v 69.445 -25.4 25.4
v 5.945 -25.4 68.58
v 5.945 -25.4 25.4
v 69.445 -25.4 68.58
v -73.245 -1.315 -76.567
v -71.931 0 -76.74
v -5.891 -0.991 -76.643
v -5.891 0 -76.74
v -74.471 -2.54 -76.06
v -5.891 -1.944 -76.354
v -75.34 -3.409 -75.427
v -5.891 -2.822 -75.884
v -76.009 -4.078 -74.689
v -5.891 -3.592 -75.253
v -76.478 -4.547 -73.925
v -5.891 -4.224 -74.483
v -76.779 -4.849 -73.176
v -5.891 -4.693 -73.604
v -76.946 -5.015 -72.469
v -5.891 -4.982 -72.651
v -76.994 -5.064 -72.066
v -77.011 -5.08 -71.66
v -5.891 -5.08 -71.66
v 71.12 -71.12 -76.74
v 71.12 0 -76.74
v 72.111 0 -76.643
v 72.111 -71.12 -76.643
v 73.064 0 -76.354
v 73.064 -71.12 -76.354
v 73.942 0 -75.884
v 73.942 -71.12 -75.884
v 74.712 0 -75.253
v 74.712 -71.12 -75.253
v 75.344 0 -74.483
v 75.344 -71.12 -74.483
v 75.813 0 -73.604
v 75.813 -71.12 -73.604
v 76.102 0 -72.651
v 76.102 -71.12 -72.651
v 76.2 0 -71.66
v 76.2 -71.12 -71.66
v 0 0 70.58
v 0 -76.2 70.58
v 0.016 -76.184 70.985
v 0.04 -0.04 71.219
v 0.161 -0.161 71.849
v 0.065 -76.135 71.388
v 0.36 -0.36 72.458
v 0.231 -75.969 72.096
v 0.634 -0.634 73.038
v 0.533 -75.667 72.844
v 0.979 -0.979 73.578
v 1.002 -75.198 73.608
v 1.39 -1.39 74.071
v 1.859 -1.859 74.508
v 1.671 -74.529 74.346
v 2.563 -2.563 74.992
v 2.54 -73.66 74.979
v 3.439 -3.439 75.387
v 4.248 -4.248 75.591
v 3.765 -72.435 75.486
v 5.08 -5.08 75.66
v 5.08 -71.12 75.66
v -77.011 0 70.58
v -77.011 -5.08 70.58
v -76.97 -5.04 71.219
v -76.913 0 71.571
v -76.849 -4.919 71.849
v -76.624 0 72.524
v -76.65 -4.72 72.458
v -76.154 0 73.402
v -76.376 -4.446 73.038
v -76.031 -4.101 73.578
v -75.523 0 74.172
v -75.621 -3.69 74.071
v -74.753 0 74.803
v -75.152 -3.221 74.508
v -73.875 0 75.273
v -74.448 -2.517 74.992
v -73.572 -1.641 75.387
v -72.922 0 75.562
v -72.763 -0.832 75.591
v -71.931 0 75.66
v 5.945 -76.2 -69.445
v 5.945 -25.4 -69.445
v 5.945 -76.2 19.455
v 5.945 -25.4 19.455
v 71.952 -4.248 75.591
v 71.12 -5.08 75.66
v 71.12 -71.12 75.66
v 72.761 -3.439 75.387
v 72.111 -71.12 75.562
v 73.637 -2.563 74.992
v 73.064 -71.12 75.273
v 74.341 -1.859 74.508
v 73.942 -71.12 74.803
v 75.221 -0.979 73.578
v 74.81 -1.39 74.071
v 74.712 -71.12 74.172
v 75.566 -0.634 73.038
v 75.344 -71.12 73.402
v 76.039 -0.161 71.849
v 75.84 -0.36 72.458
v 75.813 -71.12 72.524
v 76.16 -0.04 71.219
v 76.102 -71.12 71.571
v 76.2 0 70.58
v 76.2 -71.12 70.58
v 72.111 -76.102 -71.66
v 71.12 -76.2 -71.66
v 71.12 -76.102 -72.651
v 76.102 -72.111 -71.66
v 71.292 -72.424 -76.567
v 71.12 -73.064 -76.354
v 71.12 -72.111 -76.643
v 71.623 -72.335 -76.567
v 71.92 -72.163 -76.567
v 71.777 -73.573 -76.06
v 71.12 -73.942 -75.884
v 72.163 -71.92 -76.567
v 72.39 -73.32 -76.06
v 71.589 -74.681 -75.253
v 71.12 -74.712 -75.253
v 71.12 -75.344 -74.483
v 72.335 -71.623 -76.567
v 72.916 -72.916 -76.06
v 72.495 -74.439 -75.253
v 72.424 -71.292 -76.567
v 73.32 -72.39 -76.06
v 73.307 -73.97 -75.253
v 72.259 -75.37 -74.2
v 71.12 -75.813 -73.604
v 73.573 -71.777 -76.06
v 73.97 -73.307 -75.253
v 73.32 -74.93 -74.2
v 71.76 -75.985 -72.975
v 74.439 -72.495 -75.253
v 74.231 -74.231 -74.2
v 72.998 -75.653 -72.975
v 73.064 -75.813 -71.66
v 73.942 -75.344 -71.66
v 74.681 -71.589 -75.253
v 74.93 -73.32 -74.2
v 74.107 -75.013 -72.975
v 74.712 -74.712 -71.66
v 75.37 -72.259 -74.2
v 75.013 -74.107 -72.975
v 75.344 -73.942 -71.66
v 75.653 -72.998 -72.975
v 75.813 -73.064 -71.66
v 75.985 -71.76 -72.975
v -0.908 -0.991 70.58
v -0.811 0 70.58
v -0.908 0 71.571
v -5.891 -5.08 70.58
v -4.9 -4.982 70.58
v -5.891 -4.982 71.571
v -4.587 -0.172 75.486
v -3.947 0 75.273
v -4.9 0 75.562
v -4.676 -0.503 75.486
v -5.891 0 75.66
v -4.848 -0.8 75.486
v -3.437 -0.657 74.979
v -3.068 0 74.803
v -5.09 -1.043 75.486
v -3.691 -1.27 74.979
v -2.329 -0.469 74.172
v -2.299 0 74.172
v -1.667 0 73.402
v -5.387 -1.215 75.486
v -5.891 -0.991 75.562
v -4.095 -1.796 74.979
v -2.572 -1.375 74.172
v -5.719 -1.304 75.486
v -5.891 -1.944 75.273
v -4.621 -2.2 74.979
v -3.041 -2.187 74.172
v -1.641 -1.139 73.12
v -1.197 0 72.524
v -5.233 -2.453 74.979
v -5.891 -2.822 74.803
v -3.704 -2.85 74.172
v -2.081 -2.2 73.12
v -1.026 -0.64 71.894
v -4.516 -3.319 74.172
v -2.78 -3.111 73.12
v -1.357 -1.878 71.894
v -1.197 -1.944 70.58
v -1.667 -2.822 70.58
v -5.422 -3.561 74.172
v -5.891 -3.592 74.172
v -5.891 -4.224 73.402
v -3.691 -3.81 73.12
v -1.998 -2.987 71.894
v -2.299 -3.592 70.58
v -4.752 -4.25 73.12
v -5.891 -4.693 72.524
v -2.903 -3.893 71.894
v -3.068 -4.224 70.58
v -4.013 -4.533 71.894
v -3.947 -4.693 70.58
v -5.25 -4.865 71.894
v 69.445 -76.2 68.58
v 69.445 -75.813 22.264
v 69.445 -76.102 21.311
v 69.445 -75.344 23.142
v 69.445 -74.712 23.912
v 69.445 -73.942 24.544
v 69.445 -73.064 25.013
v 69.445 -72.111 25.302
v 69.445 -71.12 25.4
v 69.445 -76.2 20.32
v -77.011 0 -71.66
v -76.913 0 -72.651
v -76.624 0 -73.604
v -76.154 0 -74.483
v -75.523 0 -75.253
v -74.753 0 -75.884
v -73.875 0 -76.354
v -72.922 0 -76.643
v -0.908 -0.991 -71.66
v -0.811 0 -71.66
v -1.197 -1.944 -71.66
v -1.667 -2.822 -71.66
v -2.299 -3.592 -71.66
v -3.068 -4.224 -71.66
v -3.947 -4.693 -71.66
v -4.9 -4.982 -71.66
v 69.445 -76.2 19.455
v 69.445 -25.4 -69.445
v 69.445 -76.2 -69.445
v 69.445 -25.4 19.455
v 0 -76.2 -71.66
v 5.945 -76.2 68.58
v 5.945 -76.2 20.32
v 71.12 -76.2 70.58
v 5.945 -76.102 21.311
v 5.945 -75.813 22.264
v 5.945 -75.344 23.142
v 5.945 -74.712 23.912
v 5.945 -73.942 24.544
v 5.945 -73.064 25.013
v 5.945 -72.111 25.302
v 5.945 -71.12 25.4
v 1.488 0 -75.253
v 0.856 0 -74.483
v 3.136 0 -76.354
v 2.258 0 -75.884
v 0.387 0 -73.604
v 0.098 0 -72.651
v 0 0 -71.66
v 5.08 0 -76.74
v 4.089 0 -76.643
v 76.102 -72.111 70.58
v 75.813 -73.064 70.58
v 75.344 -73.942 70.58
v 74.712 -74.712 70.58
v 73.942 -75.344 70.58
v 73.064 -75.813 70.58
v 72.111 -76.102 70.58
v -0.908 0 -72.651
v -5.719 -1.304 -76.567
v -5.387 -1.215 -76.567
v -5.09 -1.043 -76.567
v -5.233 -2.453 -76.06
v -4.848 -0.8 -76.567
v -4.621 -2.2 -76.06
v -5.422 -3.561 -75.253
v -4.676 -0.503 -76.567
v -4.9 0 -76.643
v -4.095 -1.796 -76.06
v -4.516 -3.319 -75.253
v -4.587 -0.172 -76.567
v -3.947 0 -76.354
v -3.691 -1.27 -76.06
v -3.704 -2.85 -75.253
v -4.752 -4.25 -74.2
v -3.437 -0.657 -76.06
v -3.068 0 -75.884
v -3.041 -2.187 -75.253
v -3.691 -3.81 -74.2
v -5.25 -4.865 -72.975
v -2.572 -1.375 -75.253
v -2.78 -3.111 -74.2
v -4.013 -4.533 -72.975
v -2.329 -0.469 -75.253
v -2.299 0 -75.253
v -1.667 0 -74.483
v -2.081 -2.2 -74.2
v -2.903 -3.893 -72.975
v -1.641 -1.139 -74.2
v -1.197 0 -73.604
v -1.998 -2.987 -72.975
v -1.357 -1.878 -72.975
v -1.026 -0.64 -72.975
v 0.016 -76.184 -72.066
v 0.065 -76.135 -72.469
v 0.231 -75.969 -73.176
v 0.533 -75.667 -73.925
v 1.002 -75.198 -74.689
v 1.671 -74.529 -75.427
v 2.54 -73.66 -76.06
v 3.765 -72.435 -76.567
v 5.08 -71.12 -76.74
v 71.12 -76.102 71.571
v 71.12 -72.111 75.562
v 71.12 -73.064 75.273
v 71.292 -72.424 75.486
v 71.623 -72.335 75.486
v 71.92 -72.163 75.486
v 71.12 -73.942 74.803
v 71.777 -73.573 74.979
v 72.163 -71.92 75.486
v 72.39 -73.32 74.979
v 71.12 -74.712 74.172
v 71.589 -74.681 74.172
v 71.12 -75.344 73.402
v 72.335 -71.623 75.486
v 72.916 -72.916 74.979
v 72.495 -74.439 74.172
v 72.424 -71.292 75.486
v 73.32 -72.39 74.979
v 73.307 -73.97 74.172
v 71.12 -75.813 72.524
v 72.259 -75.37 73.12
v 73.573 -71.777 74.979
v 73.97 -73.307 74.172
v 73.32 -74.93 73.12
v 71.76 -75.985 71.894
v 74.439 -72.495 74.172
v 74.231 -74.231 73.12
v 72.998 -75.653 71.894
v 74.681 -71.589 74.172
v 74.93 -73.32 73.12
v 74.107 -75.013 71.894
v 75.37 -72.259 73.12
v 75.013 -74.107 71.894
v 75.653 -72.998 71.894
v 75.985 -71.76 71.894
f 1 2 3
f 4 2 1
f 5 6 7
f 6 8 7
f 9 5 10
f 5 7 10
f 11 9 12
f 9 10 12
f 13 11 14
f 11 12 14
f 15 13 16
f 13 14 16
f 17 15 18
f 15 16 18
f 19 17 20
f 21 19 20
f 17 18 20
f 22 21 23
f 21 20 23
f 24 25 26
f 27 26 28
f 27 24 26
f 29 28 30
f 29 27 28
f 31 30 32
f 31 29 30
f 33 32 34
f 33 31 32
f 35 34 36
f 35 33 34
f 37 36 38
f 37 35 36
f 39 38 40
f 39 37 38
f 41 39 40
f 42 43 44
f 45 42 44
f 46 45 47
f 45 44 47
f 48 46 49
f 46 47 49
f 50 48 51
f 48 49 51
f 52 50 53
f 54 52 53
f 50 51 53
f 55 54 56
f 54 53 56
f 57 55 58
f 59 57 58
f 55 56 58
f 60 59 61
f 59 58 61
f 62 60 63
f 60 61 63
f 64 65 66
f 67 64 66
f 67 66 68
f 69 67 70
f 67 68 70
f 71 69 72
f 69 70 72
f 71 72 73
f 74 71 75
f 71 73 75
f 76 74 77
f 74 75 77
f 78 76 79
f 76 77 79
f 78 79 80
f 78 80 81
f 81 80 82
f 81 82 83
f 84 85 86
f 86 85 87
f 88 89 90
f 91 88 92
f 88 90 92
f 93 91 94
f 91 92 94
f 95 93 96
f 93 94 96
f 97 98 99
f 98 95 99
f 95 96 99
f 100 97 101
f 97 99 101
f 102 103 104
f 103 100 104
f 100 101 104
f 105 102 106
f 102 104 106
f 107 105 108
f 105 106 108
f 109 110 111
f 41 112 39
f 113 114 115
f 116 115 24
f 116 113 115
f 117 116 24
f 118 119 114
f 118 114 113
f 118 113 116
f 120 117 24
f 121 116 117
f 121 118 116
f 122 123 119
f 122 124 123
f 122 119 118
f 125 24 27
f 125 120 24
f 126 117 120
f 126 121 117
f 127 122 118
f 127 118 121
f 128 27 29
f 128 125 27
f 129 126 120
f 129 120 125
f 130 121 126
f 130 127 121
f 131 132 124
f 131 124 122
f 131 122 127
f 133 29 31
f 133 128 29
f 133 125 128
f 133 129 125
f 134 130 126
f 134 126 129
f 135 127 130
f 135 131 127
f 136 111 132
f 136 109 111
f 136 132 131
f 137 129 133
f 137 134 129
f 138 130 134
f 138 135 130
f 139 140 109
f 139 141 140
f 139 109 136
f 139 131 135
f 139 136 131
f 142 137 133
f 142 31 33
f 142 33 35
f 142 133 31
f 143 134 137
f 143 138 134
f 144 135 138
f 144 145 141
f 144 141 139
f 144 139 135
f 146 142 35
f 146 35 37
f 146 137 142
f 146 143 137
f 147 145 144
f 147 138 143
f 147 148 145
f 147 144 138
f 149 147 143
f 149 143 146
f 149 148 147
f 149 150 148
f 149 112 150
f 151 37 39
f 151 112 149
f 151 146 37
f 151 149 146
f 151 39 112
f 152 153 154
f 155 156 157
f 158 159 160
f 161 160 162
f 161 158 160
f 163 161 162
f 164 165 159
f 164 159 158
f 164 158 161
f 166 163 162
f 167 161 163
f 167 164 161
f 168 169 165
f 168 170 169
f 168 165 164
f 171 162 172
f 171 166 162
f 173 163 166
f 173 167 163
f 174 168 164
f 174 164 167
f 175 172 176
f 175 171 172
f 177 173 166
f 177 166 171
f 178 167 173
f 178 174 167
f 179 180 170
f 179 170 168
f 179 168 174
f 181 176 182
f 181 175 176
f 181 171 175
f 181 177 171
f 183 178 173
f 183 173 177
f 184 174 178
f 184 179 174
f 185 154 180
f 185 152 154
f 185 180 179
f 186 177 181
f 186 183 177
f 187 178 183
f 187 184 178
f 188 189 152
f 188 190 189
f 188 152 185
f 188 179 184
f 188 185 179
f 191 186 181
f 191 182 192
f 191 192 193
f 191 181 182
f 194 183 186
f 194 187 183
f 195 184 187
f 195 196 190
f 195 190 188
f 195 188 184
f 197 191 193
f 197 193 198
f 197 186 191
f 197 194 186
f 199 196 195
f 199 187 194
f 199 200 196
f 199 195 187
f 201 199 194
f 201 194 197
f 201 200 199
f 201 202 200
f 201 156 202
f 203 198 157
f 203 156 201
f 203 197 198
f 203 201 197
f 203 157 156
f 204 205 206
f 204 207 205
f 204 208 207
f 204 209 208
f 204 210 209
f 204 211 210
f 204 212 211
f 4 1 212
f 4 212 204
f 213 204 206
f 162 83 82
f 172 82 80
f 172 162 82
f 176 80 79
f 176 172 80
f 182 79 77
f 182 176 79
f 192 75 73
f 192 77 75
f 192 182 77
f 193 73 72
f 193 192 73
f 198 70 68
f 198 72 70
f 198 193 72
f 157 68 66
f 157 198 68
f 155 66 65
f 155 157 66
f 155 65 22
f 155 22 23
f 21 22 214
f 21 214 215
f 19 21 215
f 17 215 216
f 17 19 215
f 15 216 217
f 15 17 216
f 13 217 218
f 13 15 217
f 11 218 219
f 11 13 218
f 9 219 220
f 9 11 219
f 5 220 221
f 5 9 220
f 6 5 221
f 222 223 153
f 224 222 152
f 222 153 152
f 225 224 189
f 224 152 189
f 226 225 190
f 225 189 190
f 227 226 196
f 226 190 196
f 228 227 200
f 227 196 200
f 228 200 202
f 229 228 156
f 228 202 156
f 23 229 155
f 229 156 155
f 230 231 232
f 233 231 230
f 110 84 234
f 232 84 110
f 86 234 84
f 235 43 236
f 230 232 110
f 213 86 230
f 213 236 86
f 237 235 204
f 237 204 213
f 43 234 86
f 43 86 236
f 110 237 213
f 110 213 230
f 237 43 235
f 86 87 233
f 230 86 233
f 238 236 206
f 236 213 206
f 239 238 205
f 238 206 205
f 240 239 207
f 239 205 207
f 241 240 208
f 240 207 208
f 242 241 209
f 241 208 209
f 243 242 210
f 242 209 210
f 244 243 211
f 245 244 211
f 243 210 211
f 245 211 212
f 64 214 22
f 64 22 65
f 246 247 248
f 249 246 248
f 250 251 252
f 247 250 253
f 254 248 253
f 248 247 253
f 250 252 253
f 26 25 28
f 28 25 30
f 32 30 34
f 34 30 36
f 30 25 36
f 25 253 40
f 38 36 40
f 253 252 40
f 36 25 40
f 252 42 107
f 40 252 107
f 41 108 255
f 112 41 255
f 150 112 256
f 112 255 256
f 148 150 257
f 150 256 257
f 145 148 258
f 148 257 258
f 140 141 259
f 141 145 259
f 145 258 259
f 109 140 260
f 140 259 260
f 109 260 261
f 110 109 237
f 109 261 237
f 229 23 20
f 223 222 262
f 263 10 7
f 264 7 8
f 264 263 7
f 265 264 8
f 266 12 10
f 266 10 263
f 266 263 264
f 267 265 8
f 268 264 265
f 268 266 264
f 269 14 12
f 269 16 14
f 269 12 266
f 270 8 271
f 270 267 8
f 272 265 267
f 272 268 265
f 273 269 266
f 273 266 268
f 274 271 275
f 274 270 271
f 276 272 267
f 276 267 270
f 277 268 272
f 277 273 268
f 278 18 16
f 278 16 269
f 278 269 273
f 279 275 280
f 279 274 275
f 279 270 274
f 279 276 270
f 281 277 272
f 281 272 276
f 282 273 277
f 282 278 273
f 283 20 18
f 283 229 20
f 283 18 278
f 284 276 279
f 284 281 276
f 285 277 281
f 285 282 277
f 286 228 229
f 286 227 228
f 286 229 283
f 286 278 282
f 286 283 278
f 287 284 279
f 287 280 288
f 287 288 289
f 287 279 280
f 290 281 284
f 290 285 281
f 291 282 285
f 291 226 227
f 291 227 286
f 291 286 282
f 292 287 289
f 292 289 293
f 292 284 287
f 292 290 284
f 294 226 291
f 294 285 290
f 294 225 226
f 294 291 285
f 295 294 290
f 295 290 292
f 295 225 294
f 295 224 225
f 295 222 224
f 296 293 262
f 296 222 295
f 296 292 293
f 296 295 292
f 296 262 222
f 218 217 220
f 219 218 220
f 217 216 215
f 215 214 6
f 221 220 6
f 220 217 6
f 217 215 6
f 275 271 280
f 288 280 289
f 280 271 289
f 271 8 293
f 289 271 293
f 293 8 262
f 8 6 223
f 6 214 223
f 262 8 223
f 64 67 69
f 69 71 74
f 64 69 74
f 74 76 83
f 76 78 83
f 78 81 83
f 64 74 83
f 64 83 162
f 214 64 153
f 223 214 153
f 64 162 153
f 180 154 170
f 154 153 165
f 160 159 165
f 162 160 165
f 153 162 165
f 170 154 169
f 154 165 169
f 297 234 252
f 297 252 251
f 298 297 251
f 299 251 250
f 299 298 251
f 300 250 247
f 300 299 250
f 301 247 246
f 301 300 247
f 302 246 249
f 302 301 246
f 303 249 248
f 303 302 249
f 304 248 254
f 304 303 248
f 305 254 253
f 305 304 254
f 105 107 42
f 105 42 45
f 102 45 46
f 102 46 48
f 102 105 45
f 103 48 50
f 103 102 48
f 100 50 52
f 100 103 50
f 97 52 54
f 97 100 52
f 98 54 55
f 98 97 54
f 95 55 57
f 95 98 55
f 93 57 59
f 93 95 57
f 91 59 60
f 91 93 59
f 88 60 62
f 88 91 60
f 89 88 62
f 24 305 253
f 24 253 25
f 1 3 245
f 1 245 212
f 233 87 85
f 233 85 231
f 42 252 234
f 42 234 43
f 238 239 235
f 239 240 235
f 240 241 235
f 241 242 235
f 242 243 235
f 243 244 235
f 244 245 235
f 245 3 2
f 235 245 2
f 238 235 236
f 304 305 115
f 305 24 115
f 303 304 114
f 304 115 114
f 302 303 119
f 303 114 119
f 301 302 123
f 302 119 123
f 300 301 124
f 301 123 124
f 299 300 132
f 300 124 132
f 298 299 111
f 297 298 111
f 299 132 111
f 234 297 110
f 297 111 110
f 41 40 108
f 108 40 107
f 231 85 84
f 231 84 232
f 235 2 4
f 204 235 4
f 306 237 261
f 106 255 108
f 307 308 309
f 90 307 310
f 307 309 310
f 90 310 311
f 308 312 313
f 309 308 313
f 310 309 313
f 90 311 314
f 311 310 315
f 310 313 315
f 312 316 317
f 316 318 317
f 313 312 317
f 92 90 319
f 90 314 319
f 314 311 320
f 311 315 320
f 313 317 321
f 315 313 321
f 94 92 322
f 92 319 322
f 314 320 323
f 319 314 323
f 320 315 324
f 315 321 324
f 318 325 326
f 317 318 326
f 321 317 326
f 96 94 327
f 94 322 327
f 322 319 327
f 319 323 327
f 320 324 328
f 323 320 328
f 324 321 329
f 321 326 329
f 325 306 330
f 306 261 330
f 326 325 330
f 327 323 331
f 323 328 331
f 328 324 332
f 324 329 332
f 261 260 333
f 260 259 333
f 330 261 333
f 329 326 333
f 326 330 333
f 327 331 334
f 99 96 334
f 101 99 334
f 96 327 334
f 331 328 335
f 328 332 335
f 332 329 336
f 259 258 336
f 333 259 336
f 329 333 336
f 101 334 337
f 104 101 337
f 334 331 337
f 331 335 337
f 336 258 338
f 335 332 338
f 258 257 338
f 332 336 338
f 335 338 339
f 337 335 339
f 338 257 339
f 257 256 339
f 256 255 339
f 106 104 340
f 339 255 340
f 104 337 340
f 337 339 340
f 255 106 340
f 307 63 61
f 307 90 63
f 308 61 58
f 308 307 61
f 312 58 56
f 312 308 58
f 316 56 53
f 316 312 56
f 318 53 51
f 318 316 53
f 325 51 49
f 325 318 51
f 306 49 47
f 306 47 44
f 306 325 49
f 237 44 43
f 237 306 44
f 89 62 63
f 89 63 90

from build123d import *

# Parameters (mm, degrees)
F0_W     = 76.2
F0_H     = 152.4
F1_DEPTH = 5.08
F0_W_2   = 63.5
F0_H_2   = 88.9
F0_H_3   = 43.18
F2_DEPTH = 76.2
F3_DEPTH = 25.4
F4_R     = 5.07999
F4_2_R   = 5.07999


# Not quite as in the source:
# - a fillet or chamfer is up to 0.001 mm smaller than in the source, because OpenCascade refuses the exact size


with BuildPart() as f1:
    # F0 (on Front) → F1 (new body)
    with BuildSketch(Plane.XZ):
        with Locations((-38.910630511, -0.5404228303)):
            Rectangle(F0_W, F0_H)
    extrude(amount=F1_DEPTH)

    # F4 (radius 5.08 in the source; OpenCascade refuses exactly that, so slightly less here)
    f4_edges = [f1.edges().sort_by_distance(p)[0] for p in [
        (-0.810631, -5.08, -0.540423),
        (-38.910631, -5.08, -76.740423),
        (-77.010631, -2.54, 75.659577),
        (-77.010631, -2.54, -76.740423),
        (-0.810631, -2.54, 75.659577),
        (-38.910631, -5.08, 75.659577),
        (-0.810631, -2.54, -76.740423),
    ]]
    fillet(f4_edges, radius=F4_R)


with BuildPart() as f2:
    # F0 (on Front) → F2 (new body)
    with BuildSketch(Plane.XZ):
        with Locations((38.1, -0.5404228303)):
            Rectangle(F0_W, F0_H)
        with Locations((37.6946805432, -24.9946735409)):
            Rectangle(F0_W_2, F0_H_2, mode=Mode.SUBTRACT)
        with Locations((37.6946805432, 46.99)):
            Rectangle(F0_W_2, F0_H_3, mode=Mode.SUBTRACT)
    extrude(amount=F2_DEPTH)

    # F0 (on Front) → F3 (join)
    with BuildSketch(Plane.XZ):
        with Locations((37.6946805432, 46.99)):
            Rectangle(F0_W_2, F0_H_3)
        with Locations((37.6946805432, -24.9946735409)):
            Rectangle(F0_W_2, F0_H_2)
    extrude(amount=F3_DEPTH)

    # F4#2 (radius 5.08 in the source; OpenCascade refuses exactly that, so slightly less here)
    f4_2_edges = [f2.edges().sort_by_distance(p)[0] for p in [
        (76.2, -76.2, -0.540423),
        (38.1, 0, 75.659577),
        (37.694681, -76.2, 25.4),
        (38.1, -76.2, -76.740423),
        (38.1, -76.2, 75.659577),
        (76.2, -38.1, 75.659577),
        (0, -38.1, 75.659577),
        (76.2, -38.1, -76.740423),
        (0, -38.1, -76.740423),
    ]]
    fillet(f4_2_edges, radius=F4_2_R)


solid = Compound([f1.part, f2.part])
